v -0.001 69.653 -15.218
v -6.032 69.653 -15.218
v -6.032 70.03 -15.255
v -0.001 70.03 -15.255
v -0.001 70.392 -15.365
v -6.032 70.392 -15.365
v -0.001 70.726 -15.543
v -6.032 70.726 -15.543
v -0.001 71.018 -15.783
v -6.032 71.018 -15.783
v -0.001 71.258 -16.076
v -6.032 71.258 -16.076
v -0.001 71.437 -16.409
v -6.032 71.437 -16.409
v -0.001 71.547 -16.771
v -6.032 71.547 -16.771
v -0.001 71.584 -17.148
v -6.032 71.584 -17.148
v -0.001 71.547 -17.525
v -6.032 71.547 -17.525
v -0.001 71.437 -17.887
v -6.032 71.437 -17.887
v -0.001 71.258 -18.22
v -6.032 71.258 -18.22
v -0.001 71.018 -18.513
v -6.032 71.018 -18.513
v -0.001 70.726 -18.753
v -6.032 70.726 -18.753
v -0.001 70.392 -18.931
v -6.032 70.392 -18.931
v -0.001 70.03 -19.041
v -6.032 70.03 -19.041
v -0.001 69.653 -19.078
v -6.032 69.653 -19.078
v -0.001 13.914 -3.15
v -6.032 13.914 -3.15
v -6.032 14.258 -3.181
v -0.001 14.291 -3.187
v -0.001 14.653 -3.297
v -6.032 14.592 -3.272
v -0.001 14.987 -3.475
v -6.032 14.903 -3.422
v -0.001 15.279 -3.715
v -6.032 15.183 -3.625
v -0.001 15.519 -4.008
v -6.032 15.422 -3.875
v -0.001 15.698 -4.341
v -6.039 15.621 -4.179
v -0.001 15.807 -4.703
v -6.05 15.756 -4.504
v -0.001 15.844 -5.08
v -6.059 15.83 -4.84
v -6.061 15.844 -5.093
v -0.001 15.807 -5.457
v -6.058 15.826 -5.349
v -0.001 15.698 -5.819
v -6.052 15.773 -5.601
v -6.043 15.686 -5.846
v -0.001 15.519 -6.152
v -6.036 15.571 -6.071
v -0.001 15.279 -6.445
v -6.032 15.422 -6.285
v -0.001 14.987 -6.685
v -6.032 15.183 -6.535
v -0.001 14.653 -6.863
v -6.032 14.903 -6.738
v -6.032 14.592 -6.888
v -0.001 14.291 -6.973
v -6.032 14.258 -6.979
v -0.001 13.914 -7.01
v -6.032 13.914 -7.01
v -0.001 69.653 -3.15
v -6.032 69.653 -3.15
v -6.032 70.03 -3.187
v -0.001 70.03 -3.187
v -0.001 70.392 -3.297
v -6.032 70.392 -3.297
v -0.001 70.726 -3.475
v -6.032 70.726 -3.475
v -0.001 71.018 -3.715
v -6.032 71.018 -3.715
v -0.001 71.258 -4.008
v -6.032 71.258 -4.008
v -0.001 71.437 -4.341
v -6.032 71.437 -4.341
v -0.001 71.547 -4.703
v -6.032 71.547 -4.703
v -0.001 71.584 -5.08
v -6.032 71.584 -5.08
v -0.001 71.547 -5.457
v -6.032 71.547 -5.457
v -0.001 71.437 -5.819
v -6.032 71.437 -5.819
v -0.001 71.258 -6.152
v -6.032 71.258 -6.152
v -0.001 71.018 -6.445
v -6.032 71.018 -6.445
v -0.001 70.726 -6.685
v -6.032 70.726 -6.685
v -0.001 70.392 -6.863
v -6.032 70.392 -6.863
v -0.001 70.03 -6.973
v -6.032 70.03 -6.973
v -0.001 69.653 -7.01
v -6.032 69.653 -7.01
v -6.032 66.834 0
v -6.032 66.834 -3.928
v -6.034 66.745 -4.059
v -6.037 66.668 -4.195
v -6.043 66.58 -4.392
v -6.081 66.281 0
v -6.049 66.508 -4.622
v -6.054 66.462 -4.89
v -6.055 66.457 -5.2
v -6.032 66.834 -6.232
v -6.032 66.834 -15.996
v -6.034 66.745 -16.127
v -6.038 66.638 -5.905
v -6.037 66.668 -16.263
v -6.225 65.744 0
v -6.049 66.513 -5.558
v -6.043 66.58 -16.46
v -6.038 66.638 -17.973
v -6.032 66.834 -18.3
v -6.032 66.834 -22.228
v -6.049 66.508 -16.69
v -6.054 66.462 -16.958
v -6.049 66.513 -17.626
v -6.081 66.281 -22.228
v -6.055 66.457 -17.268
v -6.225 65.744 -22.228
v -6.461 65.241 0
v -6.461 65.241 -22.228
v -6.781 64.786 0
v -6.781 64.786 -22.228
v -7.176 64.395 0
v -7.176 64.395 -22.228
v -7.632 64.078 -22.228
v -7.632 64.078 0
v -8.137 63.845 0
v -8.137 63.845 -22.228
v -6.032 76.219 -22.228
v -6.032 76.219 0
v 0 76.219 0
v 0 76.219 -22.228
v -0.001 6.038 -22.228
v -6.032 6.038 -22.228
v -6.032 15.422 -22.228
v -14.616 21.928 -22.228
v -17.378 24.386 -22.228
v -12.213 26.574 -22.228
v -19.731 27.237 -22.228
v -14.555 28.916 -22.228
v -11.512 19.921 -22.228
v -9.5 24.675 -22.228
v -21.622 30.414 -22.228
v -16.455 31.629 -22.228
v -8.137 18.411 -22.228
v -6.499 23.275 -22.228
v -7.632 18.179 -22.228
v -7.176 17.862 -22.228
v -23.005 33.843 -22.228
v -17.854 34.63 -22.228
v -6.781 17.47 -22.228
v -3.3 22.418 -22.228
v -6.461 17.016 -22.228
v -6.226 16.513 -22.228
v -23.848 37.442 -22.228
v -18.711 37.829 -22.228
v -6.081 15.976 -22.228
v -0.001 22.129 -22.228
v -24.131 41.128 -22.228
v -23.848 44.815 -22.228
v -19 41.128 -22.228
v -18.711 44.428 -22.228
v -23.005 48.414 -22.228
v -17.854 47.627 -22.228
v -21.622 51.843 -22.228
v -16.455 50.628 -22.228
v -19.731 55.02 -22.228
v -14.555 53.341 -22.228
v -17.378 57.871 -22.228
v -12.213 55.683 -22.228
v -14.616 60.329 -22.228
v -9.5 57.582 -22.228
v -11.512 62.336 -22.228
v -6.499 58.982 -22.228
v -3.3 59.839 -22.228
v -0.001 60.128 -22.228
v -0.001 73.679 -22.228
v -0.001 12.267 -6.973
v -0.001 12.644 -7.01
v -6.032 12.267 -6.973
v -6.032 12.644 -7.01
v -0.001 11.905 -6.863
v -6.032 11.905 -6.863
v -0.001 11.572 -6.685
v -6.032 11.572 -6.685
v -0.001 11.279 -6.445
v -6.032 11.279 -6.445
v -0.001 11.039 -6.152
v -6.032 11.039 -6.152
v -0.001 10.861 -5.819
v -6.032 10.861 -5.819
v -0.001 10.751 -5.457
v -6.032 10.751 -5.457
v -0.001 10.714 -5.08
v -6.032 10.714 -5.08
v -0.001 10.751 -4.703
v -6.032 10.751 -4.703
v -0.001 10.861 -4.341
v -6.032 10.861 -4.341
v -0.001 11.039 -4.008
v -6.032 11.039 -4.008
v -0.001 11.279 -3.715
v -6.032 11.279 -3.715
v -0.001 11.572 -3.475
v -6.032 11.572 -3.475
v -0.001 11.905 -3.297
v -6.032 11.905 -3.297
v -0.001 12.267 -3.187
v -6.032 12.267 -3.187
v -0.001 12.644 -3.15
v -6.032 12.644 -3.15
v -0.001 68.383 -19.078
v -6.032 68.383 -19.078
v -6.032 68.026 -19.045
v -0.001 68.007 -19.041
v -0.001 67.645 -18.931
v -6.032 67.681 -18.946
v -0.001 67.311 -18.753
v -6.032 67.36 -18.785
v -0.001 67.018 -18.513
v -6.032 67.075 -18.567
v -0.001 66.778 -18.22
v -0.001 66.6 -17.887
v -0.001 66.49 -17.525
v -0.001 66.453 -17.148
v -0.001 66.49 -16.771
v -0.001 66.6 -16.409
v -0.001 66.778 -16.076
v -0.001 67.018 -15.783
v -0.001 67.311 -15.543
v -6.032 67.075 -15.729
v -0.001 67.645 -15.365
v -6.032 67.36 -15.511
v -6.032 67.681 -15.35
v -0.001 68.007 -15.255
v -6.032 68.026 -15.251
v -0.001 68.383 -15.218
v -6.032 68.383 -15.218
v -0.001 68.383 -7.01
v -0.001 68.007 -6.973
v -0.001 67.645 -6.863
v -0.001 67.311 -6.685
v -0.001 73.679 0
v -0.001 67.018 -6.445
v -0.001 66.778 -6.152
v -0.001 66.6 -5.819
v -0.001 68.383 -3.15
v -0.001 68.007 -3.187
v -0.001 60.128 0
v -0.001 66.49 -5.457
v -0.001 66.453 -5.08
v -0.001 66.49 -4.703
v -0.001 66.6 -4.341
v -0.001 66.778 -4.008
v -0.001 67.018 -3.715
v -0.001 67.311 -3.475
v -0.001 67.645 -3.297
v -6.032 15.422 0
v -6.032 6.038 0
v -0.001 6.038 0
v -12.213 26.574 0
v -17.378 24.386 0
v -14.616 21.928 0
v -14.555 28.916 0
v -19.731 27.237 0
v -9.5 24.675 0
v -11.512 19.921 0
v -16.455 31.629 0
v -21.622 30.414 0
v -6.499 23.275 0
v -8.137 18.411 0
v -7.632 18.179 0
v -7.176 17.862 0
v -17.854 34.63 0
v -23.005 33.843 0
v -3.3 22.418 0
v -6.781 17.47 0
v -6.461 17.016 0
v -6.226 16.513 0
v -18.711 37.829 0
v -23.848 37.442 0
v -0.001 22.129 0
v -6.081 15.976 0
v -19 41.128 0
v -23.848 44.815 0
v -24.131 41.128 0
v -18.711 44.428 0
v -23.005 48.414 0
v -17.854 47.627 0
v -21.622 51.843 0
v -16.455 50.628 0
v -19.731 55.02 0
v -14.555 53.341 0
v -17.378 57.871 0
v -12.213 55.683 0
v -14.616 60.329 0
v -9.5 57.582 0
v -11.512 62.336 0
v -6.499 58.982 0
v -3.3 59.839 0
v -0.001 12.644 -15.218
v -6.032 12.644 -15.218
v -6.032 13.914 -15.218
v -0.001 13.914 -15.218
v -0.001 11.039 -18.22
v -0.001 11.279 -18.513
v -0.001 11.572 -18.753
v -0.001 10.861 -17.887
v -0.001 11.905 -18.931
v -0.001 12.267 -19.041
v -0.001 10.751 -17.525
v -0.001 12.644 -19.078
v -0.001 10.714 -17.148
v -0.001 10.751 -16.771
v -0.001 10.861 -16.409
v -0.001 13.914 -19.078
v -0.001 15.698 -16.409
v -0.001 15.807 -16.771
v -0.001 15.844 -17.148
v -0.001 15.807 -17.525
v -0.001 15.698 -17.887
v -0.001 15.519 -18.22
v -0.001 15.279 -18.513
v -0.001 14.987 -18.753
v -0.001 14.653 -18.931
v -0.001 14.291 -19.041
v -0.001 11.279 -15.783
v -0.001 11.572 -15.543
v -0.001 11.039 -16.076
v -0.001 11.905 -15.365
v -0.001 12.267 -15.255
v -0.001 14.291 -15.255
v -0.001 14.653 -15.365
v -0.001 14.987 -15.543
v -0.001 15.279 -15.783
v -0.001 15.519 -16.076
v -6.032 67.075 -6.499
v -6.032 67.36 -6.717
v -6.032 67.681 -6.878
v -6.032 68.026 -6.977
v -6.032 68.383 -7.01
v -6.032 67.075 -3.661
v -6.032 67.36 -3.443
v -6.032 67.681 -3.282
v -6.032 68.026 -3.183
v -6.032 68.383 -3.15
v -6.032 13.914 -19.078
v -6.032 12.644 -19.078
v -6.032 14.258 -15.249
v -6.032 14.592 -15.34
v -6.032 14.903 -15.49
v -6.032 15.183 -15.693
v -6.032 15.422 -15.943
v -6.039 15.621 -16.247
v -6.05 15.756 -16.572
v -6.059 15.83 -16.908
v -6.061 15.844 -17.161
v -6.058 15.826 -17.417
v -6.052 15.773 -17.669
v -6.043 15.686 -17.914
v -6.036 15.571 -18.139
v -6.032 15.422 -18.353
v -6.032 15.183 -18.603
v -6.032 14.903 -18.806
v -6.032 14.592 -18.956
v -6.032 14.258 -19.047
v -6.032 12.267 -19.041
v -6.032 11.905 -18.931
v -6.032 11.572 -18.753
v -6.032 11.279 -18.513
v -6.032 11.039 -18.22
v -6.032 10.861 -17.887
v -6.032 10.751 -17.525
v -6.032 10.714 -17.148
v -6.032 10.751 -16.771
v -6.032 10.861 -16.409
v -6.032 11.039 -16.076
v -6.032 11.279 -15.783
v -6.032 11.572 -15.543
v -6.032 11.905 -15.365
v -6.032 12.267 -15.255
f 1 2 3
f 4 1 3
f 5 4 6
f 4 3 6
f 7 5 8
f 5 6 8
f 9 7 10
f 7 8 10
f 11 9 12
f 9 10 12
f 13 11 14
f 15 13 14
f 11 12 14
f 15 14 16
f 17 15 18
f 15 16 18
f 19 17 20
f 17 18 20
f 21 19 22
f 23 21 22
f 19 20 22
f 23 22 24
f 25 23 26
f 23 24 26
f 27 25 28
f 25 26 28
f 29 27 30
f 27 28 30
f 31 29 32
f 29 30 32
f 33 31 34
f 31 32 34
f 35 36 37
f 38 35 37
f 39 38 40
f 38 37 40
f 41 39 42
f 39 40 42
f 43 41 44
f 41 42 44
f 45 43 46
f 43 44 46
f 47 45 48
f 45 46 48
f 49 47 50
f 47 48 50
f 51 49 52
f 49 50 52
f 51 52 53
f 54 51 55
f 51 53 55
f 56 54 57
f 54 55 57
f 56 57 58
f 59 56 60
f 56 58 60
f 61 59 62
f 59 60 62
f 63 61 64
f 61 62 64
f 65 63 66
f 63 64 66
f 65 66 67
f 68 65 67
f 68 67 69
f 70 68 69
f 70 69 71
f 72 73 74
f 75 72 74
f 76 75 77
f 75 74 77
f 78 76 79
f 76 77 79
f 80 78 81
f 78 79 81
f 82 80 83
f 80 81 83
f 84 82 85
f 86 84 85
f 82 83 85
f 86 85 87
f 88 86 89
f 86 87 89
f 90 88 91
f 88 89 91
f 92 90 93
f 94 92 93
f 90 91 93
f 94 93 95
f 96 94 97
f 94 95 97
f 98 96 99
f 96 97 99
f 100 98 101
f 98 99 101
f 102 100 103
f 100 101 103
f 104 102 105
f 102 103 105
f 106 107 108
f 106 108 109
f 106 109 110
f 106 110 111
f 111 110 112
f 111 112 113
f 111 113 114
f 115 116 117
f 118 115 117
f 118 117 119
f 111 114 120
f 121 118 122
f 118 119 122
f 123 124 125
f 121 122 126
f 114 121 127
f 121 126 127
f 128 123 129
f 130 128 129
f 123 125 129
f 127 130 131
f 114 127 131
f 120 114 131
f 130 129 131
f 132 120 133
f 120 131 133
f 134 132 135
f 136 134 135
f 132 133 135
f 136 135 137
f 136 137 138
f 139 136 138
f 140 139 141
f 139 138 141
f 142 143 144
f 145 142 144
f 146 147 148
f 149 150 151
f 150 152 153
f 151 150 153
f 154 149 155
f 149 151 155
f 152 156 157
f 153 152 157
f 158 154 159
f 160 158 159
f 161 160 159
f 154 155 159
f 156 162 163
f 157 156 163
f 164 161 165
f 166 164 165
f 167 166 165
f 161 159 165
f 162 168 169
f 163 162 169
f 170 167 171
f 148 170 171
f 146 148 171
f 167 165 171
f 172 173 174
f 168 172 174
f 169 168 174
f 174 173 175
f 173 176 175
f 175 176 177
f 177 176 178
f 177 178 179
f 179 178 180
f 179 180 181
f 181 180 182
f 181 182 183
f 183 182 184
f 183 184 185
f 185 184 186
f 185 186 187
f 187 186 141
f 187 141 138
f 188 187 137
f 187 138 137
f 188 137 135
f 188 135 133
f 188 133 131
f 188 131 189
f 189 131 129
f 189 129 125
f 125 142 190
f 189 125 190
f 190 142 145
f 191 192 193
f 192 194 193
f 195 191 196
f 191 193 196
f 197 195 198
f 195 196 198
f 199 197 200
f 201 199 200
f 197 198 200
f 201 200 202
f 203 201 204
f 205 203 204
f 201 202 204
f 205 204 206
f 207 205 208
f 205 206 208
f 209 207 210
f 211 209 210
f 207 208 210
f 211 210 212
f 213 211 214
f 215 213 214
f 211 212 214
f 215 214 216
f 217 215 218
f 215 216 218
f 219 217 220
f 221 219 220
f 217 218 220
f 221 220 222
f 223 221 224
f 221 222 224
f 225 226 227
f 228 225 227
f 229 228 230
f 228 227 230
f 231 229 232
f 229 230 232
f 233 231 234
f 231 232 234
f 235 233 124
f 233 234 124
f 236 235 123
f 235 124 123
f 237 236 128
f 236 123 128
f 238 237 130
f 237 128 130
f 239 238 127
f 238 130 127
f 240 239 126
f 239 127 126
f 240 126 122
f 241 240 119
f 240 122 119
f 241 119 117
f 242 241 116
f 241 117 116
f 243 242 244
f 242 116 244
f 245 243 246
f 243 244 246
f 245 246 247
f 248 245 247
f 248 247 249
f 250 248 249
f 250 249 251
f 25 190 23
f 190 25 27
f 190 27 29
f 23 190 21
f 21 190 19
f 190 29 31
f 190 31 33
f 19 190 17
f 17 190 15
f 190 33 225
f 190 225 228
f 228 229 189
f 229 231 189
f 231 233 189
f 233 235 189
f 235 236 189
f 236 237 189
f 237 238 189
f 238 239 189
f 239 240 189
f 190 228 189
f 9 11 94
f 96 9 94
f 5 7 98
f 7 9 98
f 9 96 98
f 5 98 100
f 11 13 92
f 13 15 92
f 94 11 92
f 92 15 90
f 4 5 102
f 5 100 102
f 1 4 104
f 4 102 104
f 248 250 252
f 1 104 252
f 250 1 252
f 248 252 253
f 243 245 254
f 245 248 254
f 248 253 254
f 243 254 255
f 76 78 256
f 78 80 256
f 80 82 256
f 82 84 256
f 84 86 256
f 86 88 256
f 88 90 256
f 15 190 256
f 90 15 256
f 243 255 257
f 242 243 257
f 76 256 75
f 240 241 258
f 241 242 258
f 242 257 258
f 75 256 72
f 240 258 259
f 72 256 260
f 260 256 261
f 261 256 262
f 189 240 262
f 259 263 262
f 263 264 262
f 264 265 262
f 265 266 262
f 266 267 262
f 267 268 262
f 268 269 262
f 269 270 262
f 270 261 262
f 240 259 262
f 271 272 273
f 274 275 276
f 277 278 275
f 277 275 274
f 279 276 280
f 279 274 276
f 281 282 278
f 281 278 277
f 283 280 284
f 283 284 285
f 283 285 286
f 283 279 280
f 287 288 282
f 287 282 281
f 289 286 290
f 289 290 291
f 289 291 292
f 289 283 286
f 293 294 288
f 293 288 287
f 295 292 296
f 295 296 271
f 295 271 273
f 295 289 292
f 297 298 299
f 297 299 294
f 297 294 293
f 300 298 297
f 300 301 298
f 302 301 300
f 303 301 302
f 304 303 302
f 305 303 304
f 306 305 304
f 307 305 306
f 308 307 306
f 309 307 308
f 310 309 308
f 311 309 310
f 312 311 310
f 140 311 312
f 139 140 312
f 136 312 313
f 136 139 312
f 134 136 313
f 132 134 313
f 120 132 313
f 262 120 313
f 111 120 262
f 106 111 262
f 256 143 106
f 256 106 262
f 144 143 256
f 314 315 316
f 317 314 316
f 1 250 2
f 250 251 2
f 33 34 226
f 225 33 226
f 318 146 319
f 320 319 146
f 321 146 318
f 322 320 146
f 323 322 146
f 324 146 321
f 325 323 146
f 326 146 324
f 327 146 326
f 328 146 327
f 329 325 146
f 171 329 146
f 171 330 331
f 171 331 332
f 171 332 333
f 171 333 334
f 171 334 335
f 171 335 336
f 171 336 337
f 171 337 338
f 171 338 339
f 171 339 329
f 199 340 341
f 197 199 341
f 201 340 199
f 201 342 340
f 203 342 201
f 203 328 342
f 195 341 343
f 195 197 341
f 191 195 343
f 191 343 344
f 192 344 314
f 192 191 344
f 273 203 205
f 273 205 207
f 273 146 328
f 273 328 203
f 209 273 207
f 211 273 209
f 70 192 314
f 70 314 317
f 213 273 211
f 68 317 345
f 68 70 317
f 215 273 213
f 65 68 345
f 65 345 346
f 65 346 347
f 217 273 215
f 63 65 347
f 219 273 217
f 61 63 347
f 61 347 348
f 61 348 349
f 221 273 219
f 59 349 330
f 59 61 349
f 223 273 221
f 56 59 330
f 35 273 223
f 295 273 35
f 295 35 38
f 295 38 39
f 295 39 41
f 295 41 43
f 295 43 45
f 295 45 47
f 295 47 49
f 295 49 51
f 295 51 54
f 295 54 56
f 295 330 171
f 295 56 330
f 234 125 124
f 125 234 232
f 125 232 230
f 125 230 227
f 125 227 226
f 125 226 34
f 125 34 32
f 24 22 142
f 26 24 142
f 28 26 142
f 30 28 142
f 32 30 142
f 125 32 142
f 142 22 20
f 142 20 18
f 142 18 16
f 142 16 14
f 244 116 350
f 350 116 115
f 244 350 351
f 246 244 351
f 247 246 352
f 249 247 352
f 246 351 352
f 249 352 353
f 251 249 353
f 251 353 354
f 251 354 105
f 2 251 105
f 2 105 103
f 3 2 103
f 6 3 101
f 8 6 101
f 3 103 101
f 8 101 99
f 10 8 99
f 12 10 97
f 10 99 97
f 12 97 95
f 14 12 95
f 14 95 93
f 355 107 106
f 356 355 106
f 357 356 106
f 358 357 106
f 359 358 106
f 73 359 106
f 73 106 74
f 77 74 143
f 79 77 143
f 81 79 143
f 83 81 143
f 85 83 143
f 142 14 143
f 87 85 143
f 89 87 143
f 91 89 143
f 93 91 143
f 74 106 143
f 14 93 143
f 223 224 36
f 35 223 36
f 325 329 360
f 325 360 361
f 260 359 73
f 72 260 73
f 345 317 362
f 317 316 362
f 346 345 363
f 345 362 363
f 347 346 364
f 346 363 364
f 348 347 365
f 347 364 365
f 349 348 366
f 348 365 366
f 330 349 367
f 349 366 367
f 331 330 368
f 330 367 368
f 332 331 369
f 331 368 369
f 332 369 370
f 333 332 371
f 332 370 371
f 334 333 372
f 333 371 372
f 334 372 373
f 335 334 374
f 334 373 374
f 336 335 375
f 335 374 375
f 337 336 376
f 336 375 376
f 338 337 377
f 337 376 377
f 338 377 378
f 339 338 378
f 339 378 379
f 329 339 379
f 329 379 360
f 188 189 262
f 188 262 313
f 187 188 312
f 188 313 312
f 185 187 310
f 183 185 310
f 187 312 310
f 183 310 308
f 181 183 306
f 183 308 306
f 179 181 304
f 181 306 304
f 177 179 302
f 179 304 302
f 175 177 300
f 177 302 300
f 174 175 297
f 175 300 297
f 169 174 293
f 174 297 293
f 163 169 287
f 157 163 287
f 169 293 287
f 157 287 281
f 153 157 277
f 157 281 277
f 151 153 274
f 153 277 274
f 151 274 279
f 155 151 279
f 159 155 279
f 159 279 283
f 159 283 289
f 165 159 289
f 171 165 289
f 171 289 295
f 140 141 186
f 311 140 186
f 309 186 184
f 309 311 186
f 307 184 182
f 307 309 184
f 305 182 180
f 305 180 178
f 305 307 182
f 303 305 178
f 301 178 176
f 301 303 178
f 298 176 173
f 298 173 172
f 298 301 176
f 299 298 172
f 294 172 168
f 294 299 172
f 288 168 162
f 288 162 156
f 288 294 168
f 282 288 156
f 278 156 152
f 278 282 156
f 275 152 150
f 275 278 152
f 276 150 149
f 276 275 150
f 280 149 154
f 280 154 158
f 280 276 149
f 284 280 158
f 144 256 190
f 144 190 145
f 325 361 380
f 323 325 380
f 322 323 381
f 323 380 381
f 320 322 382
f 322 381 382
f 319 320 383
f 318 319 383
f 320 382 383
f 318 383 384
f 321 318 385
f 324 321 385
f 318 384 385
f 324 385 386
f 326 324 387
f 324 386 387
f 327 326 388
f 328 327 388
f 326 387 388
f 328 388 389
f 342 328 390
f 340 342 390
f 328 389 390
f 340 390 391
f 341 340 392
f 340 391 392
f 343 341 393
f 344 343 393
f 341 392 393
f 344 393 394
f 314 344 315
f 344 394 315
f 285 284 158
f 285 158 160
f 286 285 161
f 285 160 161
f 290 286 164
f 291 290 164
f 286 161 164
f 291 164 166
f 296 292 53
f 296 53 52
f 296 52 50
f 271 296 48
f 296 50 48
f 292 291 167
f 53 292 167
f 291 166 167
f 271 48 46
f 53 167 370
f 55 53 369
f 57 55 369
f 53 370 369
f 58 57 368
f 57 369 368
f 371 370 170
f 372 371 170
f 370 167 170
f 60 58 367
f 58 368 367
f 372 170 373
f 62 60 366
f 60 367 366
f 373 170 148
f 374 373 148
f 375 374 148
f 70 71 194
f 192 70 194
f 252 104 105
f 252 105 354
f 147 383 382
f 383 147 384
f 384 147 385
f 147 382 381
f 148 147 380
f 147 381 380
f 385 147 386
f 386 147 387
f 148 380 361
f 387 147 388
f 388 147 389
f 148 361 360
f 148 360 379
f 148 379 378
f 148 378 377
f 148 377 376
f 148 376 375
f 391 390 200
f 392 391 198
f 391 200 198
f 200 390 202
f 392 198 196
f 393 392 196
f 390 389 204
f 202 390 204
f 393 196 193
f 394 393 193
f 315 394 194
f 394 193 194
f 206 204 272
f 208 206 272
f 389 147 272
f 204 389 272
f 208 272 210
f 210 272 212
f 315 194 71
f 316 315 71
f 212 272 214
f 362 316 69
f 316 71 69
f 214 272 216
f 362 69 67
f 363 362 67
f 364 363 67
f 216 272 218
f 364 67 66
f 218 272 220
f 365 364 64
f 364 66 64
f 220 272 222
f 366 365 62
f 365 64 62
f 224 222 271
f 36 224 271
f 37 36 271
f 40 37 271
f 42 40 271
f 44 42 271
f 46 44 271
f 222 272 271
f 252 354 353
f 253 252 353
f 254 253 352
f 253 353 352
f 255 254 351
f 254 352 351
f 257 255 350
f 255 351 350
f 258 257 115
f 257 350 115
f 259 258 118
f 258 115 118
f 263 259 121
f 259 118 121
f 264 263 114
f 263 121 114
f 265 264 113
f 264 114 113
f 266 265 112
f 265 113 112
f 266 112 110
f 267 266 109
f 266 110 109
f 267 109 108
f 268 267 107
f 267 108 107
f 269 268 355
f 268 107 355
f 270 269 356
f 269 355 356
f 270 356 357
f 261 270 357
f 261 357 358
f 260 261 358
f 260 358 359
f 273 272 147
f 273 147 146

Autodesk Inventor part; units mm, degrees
ref_plane "YZ Plane" through (0, 0, 0) normal (1, 0, 0) x (0, 1, 0)
ref_plane "XZ Plane" through (0, 0, 0) normal (0, 1, 0) x (-1, 0, 0)
ref_plane "Work Plane1" through (0, 0, 0) normal (0, 0, 1) x (1, 0, 0)
sketch "Sketch1" plane through (0, 0, 0) normal (0, 0, 1) x (1, 0, 0)
  arc A0 (18.9992, 41.108) -> (0, 60.0877) centre (-0.0008, 41.0877) ccw construction
  arc A1 (0, 22.1284) -> (18.9992, 41.108) centre (-0.0008, 41.1284) ccw construction
  arc A2 (44.3468, 60.0877) -> (25.3476, 41.108) centre (44.3476, 41.0877) ccw construction
  arc A3 (25.3476, 41.108) -> (44.3468, 22.1284) centre (44.3476, 41.1284) ccw construction
  line L0 (10.16, 73.6386) -> (5.7912, 73.6386) construction
  line L1 (0, 77.677) -> (0, 67.7202) construction
  line L2 (5.7912, 73.6386) -> (13.9012, 73.6386) construction
  line L3 (-25.35, 77.677) -> (-25.35, 84.027) projected
  line L4 (-25.35, -6.35) -> (-25.35, 0) projected
  line L5 (-25.35, 77.677) -> (-25.35, 0) construction
  arc A4 (-6.0324, 64.4924) -> (-6.0325, 17.7644) centre (-0.0008, 41.1284) ccw
  arc A5 (-6.0324, 64.4924) -> (-6.0325, 17.7644) centre (-0.0008, 41.1284) ccw
  arc A6 (-0.0008, 60.1276) -> (-0.0008, 22.1292) centre (-0.0008, 41.1284) ccw
  line L6 (-6.0324, 64.4924) -> (-6.0324, 73.6793)
  line L7 (10.16, 8.5775) -> (5.7912, 8.5775) construction
  line L8 (-6.0325, 8.5775) -> (-6.0325, 17.7644)
  line L9 (-0.0008, 73.6793) -> (-0.0008, 60.1276)
  line L10 (-0.0008, 8.5775) -> (-0.0008, 22.1292)
  line L11 (-6.0324, 73.6793) -> (-6.0324, 76.2193)
  line L12 (-6.0324, 76.2193) -> (0, 76.2193)
  line L13 (-0.0008, 73.6793) -> (0, 76.2193)
  line L14 (-6.0325, 8.5775) -> (-6.0325, 6.0375)
  line L15 (-6.0325, 6.0375) -> (-0.0008, 6.0375)
  line L16 (-0.0008, 6.0375) -> (-0.0008, 8.5775)
  point P0 (0, 0)
  dimension "d12" = 18.9992
  dimension "d13" = 24.13
  dimension "d19" = 6.0317
  dimension "d22" = 6.0317
  dimension "d23" = 0
  dimension "d24" = 0
  dimension "d44" = 2.54
  dimension "d45" = 2.54
ref_plane "Work Plane2" through (0, 17.6708, -22.228) normal (0, 0, -1) x (0, 1, 0)
extrude "Extrusion1" add sketch "Sketch1" against normal up to surface (22.228 mm away)
fillet "Fillet1" radius 3.175 1 edges at (-6.0324, 64.4924, -11.114)
fillet "Fillet2" radius 3.175 1 edges at (-6.0325, 17.7644, -11.114)
sketch "Sketch3" plane through (-6.0325, 8.5775, -22.228) normal (-1, 0, 0) x (0, 0, 1)
  circle A0 centre (5.08, 4.7016) radius 1.9304 construction
  circle A1 centre (17.148, 4.7016) radius 1.9304 construction
  circle A2 centre (17.148, 60.4409) radius 1.9304 construction
  circle A3 centre (5.08, 60.4409) radius 1.9304 construction
  line L0 (5.08, 4.0666) -> (5.08, 5.3366) construction
  line L1 (7.0104, 4.0666) -> (7.0104, 5.3366)
  line L2 (3.1496, 5.3366) -> (3.1496, 4.0666)
  arc A4 (3.1496, 4.0666) -> (7.0104, 4.0666) centre (5.08, 4.0666) ccw
  arc A5 (7.0104, 5.3366) -> (3.1496, 5.3366) centre (5.08, 5.3366) ccw
  point P0 (22.228, -8.5775)
  point P1 (5.08, 7.9375)
  dimension "d25" = 0.635
  dimension "d26" = 0.635
  dimension "d27" = 3.8608
extrude "Extrusion3" cut sketch "Sketch3" against normal through all both and the other way through all
sketch "Sketch4" plane through (-6.0325, 8.5775, -22.228) normal (-1, 0, 0) x (0, 0, 1)
  circle A0 centre (17.148, 4.7016) radius 1.9304 construction
  circle A1 centre (5.08, 60.4409) radius 1.9304 construction
  circle A2 centre (17.148, 60.4409) radius 1.9304 construction
  line L0 (17.148, 4.0666) -> (17.148, 5.3366) construction
  line L1 (19.0784, 4.0666) -> (19.0784, 5.3366)
  line L2 (15.2176, 5.3366) -> (15.2176, 4.0666)
  arc A3 (15.2176, 4.0666) -> (19.0784, 4.0666) centre (17.148, 4.0666) ccw
  arc A4 (19.0784, 5.3366) -> (15.2176, 5.3366) centre (17.148, 5.3366) ccw
  line L3 (5.08, 59.8059) -> (5.08, 61.0759) construction
  line L4 (7.0104, 59.8059) -> (7.0104, 61.0759)
  line L5 (3.1496, 61.0759) -> (3.1496, 59.8059)
  arc A5 (3.1496, 59.8059) -> (7.0104, 59.8059) centre (5.08, 59.8059) ccw
  arc A6 (7.0104, 61.0759) -> (3.1496, 61.0759) centre (5.08, 61.0759) ccw
  line L6 (17.148, 59.8059) -> (17.148, 61.0759) construction
  line L7 (19.0784, 59.8059) -> (19.0784, 61.0759)
  line L8 (15.2176, 61.0759) -> (15.2176, 59.8059)
  arc A7 (15.2176, 59.8059) -> (19.0784, 59.8059) centre (17.148, 59.8059) ccw
  arc A8 (19.0784, 61.0759) -> (15.2176, 61.0759) centre (17.148, 61.0759) ccw
  point P0 (22.228, -8.5775)
  point P1 (17.148, 4.7016)
  dimension "d30" = 0.635
  dimension "d31" = 0.635
  dimension "d32" = 0.635
  dimension "d33" = 0.635
  dimension "d34" = 0.635
  dimension "d35" = 0.635
  dimension "d36" = 3.8608
  dimension "d37" = 3.8608
  dimension "d38" = 3.8608
extrude "Extrusion4" cut sketch "Sketch4" against normal through all both and the other way through all
equation "\"d19\" = d18"
equation "\"d18\" = 6.031656"
properties part number "motor mount cap"
